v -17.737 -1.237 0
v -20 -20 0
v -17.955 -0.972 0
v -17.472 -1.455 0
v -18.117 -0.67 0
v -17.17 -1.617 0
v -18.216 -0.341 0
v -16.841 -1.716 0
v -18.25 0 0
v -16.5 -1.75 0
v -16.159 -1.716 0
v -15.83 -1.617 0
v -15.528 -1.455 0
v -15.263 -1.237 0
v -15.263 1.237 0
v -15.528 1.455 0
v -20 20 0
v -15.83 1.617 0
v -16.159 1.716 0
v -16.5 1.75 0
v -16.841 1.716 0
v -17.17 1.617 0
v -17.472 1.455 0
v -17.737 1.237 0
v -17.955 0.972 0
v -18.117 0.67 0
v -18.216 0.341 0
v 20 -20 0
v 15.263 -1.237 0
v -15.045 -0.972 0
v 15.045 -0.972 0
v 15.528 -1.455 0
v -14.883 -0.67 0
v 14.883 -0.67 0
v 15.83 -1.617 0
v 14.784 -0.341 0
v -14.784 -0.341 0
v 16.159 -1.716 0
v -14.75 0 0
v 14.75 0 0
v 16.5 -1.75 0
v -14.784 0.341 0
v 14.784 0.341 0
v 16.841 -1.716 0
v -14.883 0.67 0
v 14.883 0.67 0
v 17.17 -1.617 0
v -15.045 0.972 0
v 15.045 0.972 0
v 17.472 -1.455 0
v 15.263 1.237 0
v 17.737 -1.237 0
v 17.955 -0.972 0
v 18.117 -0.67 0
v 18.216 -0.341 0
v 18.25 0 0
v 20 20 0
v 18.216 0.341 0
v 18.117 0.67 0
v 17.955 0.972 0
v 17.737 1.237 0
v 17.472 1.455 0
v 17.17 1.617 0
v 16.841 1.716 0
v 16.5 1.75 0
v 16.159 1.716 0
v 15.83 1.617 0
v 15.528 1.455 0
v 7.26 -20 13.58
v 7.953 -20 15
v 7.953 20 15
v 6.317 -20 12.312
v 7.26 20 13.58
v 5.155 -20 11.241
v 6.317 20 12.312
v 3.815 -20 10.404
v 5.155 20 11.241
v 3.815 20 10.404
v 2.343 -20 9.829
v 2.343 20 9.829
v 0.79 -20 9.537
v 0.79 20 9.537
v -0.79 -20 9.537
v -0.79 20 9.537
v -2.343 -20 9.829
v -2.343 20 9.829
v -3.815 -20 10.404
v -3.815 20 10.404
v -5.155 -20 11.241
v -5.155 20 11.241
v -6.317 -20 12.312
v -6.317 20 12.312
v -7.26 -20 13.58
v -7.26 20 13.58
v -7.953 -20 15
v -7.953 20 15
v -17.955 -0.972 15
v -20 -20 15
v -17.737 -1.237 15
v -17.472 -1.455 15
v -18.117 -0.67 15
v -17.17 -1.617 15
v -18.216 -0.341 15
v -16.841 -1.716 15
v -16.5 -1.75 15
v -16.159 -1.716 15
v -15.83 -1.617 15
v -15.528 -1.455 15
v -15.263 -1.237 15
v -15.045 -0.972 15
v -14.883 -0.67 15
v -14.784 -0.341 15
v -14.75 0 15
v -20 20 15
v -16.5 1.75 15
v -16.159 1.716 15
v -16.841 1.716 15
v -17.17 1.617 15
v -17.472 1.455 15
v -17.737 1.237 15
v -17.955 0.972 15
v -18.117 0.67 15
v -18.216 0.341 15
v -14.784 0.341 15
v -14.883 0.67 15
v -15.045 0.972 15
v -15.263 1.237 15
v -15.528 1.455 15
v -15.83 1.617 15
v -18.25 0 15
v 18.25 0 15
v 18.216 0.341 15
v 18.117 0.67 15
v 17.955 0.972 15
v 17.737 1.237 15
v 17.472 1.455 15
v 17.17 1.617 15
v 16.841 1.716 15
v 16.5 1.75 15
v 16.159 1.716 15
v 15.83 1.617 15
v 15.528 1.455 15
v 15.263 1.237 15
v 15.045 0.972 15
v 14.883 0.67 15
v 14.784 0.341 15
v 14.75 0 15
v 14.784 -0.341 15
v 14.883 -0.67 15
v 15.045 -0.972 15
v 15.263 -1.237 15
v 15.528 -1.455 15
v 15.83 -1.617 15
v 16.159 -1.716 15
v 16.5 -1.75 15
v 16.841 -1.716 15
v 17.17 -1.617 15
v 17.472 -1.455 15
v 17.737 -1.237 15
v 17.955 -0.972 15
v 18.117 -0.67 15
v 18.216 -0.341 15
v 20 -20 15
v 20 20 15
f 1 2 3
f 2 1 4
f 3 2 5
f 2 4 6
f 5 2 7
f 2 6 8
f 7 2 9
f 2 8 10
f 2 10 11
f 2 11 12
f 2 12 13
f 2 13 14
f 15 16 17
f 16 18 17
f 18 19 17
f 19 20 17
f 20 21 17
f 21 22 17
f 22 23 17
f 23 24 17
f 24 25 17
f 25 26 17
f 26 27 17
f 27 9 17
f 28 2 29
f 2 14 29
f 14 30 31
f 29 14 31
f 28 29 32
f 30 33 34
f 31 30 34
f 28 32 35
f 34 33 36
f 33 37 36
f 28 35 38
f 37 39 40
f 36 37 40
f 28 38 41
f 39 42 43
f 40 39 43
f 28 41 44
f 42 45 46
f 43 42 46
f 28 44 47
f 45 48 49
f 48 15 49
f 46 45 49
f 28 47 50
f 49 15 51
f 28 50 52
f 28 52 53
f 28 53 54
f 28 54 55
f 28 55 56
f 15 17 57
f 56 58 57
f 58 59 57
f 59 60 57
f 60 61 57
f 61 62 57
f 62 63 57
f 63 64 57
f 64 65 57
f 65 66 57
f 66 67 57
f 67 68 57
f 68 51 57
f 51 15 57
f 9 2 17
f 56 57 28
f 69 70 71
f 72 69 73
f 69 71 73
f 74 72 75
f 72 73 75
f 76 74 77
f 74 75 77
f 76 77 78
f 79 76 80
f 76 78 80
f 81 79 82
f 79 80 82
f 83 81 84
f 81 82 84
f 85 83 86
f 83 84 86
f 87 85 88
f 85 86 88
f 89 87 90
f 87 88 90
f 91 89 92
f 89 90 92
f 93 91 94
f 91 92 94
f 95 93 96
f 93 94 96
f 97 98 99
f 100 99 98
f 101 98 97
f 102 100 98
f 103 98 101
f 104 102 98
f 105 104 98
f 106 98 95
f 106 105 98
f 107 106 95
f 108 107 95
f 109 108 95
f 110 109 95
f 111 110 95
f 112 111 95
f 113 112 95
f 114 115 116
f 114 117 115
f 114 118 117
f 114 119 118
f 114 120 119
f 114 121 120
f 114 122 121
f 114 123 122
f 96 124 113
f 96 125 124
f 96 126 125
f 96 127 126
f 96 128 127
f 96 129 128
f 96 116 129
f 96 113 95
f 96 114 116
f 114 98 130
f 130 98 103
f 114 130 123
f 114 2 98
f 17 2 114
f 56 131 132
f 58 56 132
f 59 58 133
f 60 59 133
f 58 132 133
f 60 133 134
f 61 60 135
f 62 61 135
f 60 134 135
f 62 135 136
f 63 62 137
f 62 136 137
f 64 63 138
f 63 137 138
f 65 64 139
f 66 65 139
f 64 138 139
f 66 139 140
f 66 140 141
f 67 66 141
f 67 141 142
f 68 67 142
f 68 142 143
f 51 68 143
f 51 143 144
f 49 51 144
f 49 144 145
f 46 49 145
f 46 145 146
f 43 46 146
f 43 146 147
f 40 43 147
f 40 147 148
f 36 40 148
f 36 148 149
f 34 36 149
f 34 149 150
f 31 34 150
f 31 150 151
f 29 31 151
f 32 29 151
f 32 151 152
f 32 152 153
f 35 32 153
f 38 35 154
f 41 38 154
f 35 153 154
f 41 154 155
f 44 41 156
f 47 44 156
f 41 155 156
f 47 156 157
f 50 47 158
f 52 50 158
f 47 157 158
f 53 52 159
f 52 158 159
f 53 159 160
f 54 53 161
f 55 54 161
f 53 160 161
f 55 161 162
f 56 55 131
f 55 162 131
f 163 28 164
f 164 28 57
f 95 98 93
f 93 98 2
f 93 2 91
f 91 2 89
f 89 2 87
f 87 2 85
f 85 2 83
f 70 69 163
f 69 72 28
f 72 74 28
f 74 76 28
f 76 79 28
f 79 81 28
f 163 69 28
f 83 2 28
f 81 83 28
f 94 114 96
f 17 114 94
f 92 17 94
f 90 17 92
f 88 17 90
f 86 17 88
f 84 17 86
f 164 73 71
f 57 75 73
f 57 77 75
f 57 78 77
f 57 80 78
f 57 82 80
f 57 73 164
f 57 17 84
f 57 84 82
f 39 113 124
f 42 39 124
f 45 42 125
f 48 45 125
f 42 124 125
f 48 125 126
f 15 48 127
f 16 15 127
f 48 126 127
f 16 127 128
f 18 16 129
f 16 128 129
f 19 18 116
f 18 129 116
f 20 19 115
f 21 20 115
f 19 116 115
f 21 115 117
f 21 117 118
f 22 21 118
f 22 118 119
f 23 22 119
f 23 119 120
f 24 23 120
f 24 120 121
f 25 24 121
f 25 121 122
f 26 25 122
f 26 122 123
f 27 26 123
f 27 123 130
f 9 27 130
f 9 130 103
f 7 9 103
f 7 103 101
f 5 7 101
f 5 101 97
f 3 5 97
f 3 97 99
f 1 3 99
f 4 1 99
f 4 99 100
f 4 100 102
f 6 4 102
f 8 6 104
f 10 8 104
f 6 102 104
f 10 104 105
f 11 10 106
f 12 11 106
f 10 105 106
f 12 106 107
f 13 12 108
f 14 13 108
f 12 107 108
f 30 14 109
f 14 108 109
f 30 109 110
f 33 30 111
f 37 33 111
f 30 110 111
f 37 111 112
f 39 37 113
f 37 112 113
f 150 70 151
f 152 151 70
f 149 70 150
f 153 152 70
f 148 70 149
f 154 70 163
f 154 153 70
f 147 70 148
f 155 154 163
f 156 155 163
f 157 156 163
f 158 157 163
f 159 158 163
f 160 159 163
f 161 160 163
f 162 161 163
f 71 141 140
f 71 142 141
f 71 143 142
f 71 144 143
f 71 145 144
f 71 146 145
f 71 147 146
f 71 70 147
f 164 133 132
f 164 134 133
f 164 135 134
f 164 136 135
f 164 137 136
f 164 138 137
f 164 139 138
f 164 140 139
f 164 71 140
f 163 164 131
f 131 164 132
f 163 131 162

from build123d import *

# Parameters (mm, degrees)
SKETCH1_W           = 40
SKETCH1_H           = 40
BOSS_EXTRUDE1_DEPTH = 15
SKETCH2_R           = 1.75
CUT_EXTRUDE1_DEPTH  = 16
SKETCH3_R           = 8.5
CUT_EXTRUDE2_DEPTH  = 41


with BuildPart() as part:
    # Sketch1 → Boss-Extrude1 (new body)
    with BuildSketch(Plane.XY):
        Rectangle(SKETCH1_W, SKETCH1_H)
    extrude(amount=BOSS_EXTRUDE1_DEPTH)

    # Sketch2 → Cut-Extrude1 (cut, through all)
    with BuildSketch(Plane.XY.offset(15)):
        with Locations((-16.5, 0)):
            Circle(SKETCH2_R)
        with Locations((16.5, 0)):
            Circle(SKETCH2_R)
    extrude(amount=-CUT_EXTRUDE1_DEPTH, mode=Mode.SUBTRACT)

    # Sketch3 → Cut-Extrude2 (cut, through all)
    with BuildSketch(Plane(origin=(0, 20, 0), x_dir=(1, 0, 0), z_dir=(0, 1, 0))):
        with Locations((0, -18)):
            Circle(SKETCH3_R)
    extrude(amount=-CUT_EXTRUDE2_DEPTH, mode=Mode.SUBTRACT)


solid = part.part
